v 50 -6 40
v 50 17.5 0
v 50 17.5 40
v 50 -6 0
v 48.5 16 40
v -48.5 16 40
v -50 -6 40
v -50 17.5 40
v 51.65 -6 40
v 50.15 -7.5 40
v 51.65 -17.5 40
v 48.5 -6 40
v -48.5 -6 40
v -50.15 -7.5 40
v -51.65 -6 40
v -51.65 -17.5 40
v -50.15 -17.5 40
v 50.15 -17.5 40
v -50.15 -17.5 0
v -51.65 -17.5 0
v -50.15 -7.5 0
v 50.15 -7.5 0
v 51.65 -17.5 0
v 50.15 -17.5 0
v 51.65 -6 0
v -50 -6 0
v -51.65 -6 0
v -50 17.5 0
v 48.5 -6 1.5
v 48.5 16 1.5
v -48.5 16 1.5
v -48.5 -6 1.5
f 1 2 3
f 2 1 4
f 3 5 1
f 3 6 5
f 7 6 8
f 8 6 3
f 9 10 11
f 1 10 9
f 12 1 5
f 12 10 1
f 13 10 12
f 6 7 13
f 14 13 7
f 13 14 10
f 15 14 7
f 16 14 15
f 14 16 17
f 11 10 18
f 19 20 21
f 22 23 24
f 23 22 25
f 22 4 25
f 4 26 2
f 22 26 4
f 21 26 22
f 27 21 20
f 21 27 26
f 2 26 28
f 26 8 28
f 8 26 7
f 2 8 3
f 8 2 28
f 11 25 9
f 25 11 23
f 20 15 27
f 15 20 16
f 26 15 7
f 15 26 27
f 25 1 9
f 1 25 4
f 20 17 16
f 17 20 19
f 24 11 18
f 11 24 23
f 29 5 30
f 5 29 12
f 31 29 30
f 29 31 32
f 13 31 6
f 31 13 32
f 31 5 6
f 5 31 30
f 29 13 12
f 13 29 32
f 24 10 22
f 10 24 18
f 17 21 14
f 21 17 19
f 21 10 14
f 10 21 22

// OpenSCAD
//
// Card organizer for Android: Netrunner LCG
//
// Copyright 2014 Magnus Kvevlander <magu@me.com>
//
// Creative Commons Attribution-NonCommercial 3.0 Unported (CC BY-NC 3.0)
// http://creativecommons.org/licenses/by-nc/3.0/
//

// Size of hole on the x axis
x = 97;
// Ditto on the y axis
y = 22;
// Height of the part
z = 40;

// Material thickness (1.5 sliced with 0.5 perimiters works perfect)
thk = 1.5;
// Length of gripping ledges (set to <= 0 for an edge piece without ledges altogether)
grip = 10;
// Tolerance of grip (0.15 gives a lean, but not to snug, fit; YMMV)
tol = 0.15;


// Measures of the fattest stack in the
// base game (with standard sleeves): 67x95x20 mm
// Default variables with a 1 mm gap around the
// stack for ease of insertion and extraction.

// Material thickness of 1.5 mm prints with perfect
// stability with perimiters of 0.5 mm.

// Default grip length and tolerance makes for a
// lean, but not deformingly snug, fit.

// Centering translation
translate ([-(thk + x / 2), -(thk + (y - grip) / 2), 0])
difference () {
	union () {
// Body boundary
		cube ([x + 2 * thk, y + 2 * thk, z]);
// Grip boundary
		if (grip > 0)
			translate ([-(thk + tol), -grip, 0])
				cube ([x + 4 * thk + 2 * tol, grip + thk, z]);
	}
// Cavity cutout
	translate ([thk, thk, thk])
		cube ([x, y, z]);
// Grip cutout
	translate ([-tol, -(grip + thk), -thk])
		cube ([x + 2 * thk + 2 * tol, grip + thk, z + 2 * thk]);
}
